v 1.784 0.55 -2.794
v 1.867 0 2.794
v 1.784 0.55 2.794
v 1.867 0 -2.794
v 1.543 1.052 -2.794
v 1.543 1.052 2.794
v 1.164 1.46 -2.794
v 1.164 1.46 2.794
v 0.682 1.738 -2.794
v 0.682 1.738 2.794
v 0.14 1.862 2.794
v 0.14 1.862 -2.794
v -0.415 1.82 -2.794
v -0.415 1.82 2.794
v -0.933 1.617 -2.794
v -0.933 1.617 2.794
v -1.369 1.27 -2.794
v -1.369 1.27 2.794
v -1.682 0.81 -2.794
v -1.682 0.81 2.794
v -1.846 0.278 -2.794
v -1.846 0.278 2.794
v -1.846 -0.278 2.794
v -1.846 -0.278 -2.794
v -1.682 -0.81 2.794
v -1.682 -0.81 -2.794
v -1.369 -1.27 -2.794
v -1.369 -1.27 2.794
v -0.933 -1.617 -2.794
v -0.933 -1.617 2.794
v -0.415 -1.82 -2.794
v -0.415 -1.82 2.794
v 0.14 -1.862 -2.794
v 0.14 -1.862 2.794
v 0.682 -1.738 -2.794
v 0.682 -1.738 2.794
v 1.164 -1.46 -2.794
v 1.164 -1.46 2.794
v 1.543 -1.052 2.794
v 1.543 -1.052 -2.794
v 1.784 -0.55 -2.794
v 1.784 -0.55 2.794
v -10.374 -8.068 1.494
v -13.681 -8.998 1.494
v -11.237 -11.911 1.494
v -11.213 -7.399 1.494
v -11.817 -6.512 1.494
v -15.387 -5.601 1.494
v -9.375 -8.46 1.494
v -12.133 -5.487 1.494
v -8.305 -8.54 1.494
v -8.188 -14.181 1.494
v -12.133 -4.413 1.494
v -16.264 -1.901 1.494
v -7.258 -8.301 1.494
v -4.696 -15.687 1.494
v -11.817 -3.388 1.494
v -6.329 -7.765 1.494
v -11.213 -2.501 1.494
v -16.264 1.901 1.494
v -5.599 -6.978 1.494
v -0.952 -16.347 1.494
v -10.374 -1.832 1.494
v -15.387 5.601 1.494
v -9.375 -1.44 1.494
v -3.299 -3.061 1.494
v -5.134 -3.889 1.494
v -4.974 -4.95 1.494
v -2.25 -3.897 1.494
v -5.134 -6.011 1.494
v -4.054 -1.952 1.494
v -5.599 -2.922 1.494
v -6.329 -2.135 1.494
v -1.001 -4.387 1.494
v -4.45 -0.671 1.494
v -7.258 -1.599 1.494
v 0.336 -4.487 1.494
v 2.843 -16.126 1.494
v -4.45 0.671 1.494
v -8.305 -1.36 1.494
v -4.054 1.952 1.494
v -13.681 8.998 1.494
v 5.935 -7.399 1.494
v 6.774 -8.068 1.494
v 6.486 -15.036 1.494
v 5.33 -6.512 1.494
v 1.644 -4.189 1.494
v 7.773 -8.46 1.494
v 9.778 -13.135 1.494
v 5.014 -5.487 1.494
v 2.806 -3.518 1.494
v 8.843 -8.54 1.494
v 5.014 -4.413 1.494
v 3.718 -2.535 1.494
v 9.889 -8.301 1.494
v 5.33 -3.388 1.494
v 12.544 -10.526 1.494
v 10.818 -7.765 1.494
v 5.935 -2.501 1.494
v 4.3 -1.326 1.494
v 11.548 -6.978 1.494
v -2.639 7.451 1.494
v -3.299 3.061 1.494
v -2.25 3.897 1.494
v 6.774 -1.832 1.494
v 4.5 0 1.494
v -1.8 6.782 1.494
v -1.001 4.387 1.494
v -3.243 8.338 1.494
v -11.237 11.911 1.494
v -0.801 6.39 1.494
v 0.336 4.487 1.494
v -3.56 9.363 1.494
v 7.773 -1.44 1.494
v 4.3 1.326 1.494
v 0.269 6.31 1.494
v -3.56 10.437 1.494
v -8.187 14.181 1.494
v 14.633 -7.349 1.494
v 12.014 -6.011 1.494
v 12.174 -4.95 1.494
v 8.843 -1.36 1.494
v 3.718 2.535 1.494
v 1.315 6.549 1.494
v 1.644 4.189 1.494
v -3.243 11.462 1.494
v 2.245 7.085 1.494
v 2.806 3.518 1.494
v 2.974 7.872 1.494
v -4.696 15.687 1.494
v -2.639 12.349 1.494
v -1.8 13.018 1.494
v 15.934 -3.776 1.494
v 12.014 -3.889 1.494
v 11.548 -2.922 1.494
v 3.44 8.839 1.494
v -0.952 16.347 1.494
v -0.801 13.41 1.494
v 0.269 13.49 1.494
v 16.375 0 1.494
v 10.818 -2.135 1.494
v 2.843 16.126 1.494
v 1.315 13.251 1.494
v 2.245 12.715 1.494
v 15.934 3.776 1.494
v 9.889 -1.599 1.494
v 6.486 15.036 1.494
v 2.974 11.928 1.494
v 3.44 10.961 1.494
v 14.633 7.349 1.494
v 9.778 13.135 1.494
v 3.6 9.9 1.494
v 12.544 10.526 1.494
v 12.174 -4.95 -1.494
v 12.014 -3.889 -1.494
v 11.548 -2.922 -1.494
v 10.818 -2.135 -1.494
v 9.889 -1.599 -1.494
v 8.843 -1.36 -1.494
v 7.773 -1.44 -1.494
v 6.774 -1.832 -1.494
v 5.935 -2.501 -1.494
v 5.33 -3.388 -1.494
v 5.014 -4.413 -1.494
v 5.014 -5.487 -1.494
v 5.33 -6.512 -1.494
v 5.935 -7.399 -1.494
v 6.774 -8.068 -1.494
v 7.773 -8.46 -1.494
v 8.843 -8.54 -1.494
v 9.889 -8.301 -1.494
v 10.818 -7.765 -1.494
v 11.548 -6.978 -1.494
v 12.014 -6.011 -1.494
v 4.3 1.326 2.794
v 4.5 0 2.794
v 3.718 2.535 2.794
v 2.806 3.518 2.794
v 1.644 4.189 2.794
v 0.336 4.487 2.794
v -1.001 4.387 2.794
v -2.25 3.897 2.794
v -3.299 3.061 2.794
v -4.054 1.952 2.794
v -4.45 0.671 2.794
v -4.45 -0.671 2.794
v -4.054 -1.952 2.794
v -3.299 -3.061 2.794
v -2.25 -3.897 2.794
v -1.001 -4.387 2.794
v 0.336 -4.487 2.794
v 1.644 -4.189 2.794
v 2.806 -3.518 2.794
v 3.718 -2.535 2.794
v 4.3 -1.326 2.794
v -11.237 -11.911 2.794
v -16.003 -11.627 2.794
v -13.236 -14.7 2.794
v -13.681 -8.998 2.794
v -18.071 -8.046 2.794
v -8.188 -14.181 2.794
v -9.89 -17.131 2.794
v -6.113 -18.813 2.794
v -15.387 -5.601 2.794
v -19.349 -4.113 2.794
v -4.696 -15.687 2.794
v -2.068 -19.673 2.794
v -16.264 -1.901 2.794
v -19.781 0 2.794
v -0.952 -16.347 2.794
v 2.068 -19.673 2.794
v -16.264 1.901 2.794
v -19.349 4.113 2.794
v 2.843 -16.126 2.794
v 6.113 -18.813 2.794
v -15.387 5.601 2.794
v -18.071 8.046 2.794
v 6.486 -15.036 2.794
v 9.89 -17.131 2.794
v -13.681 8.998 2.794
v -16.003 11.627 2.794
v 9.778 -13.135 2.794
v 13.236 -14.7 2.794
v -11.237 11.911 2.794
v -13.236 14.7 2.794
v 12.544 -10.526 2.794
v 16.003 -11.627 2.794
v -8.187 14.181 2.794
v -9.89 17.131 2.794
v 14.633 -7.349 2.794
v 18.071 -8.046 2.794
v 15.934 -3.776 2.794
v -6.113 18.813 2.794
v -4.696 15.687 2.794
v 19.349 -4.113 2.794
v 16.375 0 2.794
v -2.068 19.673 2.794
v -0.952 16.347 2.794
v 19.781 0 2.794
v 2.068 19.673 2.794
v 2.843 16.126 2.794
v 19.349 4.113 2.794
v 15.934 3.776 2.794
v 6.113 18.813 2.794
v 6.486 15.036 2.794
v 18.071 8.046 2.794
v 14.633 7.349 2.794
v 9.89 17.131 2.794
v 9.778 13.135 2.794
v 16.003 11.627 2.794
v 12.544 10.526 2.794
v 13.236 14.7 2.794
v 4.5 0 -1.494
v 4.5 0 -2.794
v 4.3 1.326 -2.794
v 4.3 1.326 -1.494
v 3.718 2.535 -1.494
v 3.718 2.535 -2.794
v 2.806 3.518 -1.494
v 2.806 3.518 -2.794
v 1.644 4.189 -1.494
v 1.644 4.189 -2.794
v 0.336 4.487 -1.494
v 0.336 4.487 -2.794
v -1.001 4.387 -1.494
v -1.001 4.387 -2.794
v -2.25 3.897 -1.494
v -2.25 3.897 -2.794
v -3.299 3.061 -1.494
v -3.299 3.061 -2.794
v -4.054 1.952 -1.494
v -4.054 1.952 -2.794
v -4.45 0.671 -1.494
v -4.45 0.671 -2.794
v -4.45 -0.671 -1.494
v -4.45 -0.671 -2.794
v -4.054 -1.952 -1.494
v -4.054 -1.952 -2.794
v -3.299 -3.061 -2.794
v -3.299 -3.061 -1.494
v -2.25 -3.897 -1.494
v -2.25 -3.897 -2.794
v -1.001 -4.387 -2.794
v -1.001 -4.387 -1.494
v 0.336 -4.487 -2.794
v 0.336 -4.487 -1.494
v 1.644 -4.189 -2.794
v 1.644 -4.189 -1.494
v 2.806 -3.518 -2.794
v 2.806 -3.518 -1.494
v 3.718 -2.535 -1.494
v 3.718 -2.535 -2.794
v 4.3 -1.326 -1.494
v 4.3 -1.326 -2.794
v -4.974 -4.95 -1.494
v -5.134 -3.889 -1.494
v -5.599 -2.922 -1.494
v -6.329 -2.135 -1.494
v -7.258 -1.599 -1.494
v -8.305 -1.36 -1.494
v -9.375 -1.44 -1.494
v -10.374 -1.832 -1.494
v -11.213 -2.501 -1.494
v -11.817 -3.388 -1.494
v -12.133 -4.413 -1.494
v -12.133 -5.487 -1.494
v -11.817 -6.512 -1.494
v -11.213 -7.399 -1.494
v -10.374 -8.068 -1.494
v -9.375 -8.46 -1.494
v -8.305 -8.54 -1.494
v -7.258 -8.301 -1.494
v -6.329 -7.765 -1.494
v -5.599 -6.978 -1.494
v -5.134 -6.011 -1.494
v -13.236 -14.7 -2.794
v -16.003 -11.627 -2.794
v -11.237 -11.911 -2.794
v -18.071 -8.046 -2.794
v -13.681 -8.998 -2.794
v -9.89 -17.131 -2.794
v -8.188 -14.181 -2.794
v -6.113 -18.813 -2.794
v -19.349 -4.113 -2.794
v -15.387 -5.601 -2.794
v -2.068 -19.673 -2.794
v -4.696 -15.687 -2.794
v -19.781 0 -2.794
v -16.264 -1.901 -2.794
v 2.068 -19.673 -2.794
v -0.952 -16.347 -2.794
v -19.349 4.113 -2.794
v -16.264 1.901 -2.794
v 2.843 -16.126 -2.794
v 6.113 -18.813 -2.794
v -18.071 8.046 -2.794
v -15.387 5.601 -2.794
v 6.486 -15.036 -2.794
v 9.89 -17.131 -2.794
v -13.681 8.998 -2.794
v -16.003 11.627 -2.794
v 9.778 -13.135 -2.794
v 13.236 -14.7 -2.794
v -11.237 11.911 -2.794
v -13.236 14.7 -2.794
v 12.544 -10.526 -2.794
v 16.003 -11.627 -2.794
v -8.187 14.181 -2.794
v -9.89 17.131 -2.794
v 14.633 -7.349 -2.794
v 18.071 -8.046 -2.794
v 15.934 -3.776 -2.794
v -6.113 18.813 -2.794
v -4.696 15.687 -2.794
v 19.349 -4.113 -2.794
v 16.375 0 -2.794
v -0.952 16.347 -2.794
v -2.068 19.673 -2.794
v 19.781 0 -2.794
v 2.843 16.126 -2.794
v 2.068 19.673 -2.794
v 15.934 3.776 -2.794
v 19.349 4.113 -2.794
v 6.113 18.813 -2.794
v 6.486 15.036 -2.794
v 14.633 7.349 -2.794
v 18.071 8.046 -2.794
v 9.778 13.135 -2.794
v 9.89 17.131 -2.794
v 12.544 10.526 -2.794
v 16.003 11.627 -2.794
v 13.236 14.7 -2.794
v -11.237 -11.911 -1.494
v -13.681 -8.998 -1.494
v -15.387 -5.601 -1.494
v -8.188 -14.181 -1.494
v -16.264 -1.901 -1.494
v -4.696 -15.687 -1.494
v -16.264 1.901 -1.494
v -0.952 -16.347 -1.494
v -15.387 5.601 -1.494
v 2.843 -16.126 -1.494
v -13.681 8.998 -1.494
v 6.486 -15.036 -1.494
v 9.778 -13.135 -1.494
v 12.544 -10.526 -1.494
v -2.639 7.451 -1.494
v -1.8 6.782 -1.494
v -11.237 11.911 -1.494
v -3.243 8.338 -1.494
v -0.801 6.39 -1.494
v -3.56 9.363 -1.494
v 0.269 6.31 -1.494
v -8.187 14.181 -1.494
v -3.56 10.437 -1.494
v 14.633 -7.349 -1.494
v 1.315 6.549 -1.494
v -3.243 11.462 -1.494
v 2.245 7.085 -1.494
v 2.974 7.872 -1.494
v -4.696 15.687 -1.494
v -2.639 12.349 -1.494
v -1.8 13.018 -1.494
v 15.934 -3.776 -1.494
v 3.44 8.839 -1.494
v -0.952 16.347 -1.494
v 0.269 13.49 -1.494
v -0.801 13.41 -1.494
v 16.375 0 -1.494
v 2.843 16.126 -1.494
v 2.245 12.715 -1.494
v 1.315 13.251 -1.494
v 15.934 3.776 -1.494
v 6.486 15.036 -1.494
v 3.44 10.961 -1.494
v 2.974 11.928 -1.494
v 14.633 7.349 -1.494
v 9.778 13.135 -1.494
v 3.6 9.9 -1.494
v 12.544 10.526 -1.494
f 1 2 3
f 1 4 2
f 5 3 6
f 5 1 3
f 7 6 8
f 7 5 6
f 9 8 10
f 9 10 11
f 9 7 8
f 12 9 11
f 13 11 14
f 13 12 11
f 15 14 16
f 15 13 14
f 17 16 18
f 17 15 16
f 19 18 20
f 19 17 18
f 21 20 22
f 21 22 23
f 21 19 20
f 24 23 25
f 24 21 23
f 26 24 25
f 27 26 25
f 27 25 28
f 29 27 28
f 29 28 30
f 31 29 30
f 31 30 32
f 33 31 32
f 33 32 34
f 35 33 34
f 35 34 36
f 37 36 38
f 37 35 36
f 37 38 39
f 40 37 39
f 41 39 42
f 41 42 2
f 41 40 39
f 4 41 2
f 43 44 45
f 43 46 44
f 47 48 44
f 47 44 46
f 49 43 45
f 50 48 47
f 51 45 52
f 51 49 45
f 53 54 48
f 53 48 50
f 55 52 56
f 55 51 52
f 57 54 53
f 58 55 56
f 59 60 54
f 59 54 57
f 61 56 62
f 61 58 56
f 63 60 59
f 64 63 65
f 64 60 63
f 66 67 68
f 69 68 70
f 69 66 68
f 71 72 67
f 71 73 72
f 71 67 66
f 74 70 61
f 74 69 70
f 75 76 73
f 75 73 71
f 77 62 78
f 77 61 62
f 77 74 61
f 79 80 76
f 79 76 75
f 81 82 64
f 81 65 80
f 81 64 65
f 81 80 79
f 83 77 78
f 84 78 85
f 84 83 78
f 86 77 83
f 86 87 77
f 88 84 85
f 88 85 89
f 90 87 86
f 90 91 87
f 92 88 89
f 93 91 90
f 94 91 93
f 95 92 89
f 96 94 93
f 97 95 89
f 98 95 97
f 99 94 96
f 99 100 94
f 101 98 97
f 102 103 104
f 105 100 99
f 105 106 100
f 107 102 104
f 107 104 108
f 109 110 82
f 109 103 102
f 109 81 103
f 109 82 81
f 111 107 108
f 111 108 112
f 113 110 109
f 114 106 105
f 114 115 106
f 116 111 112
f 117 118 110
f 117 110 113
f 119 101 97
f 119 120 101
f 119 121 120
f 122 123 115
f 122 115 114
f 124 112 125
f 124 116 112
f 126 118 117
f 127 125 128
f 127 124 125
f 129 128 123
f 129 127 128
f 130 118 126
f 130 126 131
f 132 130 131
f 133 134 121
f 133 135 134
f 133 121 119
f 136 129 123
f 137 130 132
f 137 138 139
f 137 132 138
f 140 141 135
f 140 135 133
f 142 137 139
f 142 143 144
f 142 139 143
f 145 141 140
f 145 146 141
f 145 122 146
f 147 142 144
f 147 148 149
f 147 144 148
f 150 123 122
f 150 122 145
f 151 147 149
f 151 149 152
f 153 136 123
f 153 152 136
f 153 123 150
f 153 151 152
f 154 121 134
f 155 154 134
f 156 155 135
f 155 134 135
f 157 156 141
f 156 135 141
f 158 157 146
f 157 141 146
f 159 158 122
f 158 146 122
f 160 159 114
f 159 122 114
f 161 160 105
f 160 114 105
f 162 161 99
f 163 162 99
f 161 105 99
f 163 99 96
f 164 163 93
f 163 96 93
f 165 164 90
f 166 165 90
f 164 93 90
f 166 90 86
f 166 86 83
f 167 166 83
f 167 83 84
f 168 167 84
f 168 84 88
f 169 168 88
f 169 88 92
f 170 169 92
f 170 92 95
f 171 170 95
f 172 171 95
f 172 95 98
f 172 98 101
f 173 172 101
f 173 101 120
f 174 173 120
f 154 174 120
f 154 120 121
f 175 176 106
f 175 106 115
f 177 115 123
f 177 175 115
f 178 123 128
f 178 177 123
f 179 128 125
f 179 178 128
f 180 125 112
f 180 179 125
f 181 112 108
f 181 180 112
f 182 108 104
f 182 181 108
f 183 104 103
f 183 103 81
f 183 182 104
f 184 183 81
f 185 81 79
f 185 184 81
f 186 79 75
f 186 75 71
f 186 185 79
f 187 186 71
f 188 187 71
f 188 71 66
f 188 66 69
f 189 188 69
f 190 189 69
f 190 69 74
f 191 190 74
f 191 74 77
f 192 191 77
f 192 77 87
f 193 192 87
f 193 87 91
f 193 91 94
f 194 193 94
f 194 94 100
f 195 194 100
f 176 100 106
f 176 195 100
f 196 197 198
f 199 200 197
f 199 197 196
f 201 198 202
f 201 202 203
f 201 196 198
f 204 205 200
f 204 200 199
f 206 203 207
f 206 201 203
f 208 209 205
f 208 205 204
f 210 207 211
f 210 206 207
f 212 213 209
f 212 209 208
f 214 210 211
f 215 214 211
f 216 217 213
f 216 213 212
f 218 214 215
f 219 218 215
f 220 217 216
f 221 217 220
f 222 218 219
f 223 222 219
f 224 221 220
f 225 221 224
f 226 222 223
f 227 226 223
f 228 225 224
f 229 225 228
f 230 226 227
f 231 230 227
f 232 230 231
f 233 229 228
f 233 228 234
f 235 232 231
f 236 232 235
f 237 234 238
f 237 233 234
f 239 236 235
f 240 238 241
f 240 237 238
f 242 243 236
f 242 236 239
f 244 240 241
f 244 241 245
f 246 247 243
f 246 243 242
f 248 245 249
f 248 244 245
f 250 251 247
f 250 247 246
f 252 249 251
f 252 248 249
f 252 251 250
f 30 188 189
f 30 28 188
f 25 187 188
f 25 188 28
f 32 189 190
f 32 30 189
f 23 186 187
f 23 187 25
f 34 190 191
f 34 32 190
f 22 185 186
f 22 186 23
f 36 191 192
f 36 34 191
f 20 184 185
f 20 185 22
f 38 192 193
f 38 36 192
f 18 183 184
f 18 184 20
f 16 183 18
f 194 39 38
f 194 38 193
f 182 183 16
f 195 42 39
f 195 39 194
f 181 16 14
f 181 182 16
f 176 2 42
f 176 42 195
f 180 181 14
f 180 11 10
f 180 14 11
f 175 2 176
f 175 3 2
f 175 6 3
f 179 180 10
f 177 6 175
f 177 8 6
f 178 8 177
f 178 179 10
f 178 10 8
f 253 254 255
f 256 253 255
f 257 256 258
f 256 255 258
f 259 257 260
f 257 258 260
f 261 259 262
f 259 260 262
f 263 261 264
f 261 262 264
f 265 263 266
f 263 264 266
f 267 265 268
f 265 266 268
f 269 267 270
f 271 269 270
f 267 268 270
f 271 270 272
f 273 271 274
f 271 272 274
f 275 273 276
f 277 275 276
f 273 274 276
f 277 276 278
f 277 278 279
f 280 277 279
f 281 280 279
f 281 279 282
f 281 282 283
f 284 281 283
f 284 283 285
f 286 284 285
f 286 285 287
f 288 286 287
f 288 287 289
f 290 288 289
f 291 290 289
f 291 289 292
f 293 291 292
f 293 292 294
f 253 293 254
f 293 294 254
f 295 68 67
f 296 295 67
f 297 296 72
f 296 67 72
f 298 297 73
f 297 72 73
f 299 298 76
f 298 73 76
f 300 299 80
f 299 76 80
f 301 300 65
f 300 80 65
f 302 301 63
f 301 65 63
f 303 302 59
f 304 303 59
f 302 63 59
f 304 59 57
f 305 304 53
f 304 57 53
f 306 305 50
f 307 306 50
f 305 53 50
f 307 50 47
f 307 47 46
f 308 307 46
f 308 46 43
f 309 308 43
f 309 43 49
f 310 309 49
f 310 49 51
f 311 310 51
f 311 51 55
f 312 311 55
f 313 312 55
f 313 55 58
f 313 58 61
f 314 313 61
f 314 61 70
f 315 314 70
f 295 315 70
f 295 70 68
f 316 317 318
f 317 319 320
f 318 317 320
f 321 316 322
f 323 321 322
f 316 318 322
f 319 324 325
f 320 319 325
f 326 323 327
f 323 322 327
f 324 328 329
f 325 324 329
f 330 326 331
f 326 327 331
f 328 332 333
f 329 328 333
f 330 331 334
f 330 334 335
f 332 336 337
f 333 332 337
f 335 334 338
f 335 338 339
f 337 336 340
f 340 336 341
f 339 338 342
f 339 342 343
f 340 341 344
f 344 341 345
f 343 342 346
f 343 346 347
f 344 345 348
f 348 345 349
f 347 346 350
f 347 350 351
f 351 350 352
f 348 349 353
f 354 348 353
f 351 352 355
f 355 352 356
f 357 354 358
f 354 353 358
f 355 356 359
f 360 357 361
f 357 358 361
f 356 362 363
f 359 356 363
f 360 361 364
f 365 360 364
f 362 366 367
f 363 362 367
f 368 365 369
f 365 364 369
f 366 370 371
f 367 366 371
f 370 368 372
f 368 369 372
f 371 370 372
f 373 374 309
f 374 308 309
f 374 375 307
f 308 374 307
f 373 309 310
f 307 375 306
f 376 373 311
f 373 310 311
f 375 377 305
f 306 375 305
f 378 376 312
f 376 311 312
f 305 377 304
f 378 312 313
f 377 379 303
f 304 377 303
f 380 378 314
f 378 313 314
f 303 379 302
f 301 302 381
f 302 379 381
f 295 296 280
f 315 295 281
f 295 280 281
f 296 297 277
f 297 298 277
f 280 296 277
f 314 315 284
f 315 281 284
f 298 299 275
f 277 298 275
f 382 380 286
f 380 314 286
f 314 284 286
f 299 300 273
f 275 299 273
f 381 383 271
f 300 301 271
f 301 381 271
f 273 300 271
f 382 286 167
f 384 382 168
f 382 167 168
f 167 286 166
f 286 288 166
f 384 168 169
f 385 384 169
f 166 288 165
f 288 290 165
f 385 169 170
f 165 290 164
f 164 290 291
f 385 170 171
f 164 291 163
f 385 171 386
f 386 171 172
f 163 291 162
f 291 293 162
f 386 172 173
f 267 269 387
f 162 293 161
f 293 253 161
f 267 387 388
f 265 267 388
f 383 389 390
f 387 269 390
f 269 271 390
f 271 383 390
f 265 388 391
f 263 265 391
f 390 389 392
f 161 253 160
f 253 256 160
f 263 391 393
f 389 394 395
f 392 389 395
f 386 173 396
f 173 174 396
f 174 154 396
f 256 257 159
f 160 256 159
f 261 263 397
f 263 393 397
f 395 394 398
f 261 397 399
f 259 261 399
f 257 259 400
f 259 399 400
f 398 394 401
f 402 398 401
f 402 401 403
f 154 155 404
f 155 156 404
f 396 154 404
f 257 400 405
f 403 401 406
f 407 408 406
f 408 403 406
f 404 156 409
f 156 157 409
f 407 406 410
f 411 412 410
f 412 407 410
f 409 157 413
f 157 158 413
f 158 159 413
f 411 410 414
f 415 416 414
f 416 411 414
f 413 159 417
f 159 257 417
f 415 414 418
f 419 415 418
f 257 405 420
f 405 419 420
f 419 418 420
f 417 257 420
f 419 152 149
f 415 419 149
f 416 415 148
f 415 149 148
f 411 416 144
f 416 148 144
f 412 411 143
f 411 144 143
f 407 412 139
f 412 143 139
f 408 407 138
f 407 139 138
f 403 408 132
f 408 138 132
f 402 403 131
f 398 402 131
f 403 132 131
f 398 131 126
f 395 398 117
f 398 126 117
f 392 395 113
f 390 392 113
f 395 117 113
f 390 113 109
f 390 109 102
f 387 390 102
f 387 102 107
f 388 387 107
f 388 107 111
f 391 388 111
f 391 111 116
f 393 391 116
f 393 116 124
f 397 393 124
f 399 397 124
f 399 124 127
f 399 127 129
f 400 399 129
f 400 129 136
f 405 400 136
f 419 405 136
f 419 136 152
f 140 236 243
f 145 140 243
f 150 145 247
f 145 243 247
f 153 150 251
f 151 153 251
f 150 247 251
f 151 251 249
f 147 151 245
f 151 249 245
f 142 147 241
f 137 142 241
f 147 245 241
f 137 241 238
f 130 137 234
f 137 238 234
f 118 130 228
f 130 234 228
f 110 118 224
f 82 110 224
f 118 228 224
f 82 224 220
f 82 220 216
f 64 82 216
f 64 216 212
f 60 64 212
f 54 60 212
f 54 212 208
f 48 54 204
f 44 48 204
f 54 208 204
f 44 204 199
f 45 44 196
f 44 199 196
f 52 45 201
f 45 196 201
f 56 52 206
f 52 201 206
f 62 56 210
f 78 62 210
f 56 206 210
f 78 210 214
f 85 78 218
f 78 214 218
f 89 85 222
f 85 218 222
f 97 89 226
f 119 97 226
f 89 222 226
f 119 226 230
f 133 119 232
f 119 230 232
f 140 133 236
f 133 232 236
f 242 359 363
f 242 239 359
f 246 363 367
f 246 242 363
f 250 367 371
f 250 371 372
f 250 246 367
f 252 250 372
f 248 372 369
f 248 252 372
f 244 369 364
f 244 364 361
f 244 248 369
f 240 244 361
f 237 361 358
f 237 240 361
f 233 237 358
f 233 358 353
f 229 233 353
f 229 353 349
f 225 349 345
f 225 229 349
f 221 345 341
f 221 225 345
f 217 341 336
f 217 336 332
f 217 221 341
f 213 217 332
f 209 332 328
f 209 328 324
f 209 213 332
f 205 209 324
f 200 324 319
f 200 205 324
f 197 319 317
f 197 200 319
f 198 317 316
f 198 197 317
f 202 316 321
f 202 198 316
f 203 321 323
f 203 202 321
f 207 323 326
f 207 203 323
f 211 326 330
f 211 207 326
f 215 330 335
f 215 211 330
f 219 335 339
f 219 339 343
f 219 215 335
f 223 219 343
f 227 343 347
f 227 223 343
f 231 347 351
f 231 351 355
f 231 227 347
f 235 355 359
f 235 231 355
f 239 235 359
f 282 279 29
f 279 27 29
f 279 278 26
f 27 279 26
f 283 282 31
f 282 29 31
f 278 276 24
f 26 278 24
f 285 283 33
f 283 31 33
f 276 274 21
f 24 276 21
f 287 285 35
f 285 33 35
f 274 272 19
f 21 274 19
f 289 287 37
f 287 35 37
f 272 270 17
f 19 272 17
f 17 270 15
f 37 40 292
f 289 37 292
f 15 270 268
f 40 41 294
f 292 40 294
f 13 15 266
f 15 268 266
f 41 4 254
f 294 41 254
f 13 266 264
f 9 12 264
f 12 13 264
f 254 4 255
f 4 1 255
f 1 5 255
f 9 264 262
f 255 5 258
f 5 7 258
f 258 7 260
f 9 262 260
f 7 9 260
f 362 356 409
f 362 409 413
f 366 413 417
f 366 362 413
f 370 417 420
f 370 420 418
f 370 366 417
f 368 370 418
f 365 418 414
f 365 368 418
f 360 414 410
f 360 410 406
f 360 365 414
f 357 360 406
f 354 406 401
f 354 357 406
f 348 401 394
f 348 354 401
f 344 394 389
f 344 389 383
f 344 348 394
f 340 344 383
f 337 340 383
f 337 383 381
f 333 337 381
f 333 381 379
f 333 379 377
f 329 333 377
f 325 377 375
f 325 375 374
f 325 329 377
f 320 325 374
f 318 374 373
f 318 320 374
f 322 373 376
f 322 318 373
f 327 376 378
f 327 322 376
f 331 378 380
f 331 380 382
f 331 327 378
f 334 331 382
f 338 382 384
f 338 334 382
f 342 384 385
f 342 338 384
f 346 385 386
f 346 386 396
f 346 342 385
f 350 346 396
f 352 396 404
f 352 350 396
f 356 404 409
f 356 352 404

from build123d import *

# Parameters (mm, degrees)
SKETCH1_R           = 19.78095238
SKETCH1_R_2         = 1.8669
BOSS_EXTRUDE1_DEPTH = 2.794
SKETCH2_R           = 16.375
SKETCH2_R_2         = 4.5
CUT_EXTRUDE1_DEPTH  = 1.3
SKETCH3_R           = 3.6
CUT_EXTRUDE2_DEPTH  = 29.301220789


with BuildPart() as part:
    # Sketch1 → Boss-Extrude1 (new, symmetric)
    with BuildSketch(Plane.XY):
        Circle(SKETCH1_R)
        Circle(SKETCH1_R_2, mode=Mode.SUBTRACT)
    extrude(amount=BOSS_EXTRUDE1_DEPTH, both=True)

    # Sketch2 → Cut-Extrude1 (cut)
    with BuildSketch(Plane.XY.offset(2.794)):
        Circle(SKETCH2_R)
        Circle(SKETCH2_R_2, mode=Mode.SUBTRACT)
    cut_extrude1 = extrude(amount=-CUT_EXTRUDE1_DEPTH, mode=Mode.SUBTRACT)

    # Mirror1: Cut-Extrude1 across plane
    add(cut_extrude1.mirror(Plane.XY), mode=Mode.SUBTRACT)

    # Sketch3 → Cut-Extrude2 (cut, through all)
    with BuildSketch(Plane.XY.offset(1.494)):
        with Locations((0, 9.9)):
            Circle(SKETCH3_R)
        with Locations((8.573651497, -4.95)):
            Circle(SKETCH3_R)
        with Locations((-8.573651497, -4.95)):
            Circle(SKETCH3_R)
    extrude(amount=-CUT_EXTRUDE2_DEPTH, mode=Mode.SUBTRACT)


solid = part.part
